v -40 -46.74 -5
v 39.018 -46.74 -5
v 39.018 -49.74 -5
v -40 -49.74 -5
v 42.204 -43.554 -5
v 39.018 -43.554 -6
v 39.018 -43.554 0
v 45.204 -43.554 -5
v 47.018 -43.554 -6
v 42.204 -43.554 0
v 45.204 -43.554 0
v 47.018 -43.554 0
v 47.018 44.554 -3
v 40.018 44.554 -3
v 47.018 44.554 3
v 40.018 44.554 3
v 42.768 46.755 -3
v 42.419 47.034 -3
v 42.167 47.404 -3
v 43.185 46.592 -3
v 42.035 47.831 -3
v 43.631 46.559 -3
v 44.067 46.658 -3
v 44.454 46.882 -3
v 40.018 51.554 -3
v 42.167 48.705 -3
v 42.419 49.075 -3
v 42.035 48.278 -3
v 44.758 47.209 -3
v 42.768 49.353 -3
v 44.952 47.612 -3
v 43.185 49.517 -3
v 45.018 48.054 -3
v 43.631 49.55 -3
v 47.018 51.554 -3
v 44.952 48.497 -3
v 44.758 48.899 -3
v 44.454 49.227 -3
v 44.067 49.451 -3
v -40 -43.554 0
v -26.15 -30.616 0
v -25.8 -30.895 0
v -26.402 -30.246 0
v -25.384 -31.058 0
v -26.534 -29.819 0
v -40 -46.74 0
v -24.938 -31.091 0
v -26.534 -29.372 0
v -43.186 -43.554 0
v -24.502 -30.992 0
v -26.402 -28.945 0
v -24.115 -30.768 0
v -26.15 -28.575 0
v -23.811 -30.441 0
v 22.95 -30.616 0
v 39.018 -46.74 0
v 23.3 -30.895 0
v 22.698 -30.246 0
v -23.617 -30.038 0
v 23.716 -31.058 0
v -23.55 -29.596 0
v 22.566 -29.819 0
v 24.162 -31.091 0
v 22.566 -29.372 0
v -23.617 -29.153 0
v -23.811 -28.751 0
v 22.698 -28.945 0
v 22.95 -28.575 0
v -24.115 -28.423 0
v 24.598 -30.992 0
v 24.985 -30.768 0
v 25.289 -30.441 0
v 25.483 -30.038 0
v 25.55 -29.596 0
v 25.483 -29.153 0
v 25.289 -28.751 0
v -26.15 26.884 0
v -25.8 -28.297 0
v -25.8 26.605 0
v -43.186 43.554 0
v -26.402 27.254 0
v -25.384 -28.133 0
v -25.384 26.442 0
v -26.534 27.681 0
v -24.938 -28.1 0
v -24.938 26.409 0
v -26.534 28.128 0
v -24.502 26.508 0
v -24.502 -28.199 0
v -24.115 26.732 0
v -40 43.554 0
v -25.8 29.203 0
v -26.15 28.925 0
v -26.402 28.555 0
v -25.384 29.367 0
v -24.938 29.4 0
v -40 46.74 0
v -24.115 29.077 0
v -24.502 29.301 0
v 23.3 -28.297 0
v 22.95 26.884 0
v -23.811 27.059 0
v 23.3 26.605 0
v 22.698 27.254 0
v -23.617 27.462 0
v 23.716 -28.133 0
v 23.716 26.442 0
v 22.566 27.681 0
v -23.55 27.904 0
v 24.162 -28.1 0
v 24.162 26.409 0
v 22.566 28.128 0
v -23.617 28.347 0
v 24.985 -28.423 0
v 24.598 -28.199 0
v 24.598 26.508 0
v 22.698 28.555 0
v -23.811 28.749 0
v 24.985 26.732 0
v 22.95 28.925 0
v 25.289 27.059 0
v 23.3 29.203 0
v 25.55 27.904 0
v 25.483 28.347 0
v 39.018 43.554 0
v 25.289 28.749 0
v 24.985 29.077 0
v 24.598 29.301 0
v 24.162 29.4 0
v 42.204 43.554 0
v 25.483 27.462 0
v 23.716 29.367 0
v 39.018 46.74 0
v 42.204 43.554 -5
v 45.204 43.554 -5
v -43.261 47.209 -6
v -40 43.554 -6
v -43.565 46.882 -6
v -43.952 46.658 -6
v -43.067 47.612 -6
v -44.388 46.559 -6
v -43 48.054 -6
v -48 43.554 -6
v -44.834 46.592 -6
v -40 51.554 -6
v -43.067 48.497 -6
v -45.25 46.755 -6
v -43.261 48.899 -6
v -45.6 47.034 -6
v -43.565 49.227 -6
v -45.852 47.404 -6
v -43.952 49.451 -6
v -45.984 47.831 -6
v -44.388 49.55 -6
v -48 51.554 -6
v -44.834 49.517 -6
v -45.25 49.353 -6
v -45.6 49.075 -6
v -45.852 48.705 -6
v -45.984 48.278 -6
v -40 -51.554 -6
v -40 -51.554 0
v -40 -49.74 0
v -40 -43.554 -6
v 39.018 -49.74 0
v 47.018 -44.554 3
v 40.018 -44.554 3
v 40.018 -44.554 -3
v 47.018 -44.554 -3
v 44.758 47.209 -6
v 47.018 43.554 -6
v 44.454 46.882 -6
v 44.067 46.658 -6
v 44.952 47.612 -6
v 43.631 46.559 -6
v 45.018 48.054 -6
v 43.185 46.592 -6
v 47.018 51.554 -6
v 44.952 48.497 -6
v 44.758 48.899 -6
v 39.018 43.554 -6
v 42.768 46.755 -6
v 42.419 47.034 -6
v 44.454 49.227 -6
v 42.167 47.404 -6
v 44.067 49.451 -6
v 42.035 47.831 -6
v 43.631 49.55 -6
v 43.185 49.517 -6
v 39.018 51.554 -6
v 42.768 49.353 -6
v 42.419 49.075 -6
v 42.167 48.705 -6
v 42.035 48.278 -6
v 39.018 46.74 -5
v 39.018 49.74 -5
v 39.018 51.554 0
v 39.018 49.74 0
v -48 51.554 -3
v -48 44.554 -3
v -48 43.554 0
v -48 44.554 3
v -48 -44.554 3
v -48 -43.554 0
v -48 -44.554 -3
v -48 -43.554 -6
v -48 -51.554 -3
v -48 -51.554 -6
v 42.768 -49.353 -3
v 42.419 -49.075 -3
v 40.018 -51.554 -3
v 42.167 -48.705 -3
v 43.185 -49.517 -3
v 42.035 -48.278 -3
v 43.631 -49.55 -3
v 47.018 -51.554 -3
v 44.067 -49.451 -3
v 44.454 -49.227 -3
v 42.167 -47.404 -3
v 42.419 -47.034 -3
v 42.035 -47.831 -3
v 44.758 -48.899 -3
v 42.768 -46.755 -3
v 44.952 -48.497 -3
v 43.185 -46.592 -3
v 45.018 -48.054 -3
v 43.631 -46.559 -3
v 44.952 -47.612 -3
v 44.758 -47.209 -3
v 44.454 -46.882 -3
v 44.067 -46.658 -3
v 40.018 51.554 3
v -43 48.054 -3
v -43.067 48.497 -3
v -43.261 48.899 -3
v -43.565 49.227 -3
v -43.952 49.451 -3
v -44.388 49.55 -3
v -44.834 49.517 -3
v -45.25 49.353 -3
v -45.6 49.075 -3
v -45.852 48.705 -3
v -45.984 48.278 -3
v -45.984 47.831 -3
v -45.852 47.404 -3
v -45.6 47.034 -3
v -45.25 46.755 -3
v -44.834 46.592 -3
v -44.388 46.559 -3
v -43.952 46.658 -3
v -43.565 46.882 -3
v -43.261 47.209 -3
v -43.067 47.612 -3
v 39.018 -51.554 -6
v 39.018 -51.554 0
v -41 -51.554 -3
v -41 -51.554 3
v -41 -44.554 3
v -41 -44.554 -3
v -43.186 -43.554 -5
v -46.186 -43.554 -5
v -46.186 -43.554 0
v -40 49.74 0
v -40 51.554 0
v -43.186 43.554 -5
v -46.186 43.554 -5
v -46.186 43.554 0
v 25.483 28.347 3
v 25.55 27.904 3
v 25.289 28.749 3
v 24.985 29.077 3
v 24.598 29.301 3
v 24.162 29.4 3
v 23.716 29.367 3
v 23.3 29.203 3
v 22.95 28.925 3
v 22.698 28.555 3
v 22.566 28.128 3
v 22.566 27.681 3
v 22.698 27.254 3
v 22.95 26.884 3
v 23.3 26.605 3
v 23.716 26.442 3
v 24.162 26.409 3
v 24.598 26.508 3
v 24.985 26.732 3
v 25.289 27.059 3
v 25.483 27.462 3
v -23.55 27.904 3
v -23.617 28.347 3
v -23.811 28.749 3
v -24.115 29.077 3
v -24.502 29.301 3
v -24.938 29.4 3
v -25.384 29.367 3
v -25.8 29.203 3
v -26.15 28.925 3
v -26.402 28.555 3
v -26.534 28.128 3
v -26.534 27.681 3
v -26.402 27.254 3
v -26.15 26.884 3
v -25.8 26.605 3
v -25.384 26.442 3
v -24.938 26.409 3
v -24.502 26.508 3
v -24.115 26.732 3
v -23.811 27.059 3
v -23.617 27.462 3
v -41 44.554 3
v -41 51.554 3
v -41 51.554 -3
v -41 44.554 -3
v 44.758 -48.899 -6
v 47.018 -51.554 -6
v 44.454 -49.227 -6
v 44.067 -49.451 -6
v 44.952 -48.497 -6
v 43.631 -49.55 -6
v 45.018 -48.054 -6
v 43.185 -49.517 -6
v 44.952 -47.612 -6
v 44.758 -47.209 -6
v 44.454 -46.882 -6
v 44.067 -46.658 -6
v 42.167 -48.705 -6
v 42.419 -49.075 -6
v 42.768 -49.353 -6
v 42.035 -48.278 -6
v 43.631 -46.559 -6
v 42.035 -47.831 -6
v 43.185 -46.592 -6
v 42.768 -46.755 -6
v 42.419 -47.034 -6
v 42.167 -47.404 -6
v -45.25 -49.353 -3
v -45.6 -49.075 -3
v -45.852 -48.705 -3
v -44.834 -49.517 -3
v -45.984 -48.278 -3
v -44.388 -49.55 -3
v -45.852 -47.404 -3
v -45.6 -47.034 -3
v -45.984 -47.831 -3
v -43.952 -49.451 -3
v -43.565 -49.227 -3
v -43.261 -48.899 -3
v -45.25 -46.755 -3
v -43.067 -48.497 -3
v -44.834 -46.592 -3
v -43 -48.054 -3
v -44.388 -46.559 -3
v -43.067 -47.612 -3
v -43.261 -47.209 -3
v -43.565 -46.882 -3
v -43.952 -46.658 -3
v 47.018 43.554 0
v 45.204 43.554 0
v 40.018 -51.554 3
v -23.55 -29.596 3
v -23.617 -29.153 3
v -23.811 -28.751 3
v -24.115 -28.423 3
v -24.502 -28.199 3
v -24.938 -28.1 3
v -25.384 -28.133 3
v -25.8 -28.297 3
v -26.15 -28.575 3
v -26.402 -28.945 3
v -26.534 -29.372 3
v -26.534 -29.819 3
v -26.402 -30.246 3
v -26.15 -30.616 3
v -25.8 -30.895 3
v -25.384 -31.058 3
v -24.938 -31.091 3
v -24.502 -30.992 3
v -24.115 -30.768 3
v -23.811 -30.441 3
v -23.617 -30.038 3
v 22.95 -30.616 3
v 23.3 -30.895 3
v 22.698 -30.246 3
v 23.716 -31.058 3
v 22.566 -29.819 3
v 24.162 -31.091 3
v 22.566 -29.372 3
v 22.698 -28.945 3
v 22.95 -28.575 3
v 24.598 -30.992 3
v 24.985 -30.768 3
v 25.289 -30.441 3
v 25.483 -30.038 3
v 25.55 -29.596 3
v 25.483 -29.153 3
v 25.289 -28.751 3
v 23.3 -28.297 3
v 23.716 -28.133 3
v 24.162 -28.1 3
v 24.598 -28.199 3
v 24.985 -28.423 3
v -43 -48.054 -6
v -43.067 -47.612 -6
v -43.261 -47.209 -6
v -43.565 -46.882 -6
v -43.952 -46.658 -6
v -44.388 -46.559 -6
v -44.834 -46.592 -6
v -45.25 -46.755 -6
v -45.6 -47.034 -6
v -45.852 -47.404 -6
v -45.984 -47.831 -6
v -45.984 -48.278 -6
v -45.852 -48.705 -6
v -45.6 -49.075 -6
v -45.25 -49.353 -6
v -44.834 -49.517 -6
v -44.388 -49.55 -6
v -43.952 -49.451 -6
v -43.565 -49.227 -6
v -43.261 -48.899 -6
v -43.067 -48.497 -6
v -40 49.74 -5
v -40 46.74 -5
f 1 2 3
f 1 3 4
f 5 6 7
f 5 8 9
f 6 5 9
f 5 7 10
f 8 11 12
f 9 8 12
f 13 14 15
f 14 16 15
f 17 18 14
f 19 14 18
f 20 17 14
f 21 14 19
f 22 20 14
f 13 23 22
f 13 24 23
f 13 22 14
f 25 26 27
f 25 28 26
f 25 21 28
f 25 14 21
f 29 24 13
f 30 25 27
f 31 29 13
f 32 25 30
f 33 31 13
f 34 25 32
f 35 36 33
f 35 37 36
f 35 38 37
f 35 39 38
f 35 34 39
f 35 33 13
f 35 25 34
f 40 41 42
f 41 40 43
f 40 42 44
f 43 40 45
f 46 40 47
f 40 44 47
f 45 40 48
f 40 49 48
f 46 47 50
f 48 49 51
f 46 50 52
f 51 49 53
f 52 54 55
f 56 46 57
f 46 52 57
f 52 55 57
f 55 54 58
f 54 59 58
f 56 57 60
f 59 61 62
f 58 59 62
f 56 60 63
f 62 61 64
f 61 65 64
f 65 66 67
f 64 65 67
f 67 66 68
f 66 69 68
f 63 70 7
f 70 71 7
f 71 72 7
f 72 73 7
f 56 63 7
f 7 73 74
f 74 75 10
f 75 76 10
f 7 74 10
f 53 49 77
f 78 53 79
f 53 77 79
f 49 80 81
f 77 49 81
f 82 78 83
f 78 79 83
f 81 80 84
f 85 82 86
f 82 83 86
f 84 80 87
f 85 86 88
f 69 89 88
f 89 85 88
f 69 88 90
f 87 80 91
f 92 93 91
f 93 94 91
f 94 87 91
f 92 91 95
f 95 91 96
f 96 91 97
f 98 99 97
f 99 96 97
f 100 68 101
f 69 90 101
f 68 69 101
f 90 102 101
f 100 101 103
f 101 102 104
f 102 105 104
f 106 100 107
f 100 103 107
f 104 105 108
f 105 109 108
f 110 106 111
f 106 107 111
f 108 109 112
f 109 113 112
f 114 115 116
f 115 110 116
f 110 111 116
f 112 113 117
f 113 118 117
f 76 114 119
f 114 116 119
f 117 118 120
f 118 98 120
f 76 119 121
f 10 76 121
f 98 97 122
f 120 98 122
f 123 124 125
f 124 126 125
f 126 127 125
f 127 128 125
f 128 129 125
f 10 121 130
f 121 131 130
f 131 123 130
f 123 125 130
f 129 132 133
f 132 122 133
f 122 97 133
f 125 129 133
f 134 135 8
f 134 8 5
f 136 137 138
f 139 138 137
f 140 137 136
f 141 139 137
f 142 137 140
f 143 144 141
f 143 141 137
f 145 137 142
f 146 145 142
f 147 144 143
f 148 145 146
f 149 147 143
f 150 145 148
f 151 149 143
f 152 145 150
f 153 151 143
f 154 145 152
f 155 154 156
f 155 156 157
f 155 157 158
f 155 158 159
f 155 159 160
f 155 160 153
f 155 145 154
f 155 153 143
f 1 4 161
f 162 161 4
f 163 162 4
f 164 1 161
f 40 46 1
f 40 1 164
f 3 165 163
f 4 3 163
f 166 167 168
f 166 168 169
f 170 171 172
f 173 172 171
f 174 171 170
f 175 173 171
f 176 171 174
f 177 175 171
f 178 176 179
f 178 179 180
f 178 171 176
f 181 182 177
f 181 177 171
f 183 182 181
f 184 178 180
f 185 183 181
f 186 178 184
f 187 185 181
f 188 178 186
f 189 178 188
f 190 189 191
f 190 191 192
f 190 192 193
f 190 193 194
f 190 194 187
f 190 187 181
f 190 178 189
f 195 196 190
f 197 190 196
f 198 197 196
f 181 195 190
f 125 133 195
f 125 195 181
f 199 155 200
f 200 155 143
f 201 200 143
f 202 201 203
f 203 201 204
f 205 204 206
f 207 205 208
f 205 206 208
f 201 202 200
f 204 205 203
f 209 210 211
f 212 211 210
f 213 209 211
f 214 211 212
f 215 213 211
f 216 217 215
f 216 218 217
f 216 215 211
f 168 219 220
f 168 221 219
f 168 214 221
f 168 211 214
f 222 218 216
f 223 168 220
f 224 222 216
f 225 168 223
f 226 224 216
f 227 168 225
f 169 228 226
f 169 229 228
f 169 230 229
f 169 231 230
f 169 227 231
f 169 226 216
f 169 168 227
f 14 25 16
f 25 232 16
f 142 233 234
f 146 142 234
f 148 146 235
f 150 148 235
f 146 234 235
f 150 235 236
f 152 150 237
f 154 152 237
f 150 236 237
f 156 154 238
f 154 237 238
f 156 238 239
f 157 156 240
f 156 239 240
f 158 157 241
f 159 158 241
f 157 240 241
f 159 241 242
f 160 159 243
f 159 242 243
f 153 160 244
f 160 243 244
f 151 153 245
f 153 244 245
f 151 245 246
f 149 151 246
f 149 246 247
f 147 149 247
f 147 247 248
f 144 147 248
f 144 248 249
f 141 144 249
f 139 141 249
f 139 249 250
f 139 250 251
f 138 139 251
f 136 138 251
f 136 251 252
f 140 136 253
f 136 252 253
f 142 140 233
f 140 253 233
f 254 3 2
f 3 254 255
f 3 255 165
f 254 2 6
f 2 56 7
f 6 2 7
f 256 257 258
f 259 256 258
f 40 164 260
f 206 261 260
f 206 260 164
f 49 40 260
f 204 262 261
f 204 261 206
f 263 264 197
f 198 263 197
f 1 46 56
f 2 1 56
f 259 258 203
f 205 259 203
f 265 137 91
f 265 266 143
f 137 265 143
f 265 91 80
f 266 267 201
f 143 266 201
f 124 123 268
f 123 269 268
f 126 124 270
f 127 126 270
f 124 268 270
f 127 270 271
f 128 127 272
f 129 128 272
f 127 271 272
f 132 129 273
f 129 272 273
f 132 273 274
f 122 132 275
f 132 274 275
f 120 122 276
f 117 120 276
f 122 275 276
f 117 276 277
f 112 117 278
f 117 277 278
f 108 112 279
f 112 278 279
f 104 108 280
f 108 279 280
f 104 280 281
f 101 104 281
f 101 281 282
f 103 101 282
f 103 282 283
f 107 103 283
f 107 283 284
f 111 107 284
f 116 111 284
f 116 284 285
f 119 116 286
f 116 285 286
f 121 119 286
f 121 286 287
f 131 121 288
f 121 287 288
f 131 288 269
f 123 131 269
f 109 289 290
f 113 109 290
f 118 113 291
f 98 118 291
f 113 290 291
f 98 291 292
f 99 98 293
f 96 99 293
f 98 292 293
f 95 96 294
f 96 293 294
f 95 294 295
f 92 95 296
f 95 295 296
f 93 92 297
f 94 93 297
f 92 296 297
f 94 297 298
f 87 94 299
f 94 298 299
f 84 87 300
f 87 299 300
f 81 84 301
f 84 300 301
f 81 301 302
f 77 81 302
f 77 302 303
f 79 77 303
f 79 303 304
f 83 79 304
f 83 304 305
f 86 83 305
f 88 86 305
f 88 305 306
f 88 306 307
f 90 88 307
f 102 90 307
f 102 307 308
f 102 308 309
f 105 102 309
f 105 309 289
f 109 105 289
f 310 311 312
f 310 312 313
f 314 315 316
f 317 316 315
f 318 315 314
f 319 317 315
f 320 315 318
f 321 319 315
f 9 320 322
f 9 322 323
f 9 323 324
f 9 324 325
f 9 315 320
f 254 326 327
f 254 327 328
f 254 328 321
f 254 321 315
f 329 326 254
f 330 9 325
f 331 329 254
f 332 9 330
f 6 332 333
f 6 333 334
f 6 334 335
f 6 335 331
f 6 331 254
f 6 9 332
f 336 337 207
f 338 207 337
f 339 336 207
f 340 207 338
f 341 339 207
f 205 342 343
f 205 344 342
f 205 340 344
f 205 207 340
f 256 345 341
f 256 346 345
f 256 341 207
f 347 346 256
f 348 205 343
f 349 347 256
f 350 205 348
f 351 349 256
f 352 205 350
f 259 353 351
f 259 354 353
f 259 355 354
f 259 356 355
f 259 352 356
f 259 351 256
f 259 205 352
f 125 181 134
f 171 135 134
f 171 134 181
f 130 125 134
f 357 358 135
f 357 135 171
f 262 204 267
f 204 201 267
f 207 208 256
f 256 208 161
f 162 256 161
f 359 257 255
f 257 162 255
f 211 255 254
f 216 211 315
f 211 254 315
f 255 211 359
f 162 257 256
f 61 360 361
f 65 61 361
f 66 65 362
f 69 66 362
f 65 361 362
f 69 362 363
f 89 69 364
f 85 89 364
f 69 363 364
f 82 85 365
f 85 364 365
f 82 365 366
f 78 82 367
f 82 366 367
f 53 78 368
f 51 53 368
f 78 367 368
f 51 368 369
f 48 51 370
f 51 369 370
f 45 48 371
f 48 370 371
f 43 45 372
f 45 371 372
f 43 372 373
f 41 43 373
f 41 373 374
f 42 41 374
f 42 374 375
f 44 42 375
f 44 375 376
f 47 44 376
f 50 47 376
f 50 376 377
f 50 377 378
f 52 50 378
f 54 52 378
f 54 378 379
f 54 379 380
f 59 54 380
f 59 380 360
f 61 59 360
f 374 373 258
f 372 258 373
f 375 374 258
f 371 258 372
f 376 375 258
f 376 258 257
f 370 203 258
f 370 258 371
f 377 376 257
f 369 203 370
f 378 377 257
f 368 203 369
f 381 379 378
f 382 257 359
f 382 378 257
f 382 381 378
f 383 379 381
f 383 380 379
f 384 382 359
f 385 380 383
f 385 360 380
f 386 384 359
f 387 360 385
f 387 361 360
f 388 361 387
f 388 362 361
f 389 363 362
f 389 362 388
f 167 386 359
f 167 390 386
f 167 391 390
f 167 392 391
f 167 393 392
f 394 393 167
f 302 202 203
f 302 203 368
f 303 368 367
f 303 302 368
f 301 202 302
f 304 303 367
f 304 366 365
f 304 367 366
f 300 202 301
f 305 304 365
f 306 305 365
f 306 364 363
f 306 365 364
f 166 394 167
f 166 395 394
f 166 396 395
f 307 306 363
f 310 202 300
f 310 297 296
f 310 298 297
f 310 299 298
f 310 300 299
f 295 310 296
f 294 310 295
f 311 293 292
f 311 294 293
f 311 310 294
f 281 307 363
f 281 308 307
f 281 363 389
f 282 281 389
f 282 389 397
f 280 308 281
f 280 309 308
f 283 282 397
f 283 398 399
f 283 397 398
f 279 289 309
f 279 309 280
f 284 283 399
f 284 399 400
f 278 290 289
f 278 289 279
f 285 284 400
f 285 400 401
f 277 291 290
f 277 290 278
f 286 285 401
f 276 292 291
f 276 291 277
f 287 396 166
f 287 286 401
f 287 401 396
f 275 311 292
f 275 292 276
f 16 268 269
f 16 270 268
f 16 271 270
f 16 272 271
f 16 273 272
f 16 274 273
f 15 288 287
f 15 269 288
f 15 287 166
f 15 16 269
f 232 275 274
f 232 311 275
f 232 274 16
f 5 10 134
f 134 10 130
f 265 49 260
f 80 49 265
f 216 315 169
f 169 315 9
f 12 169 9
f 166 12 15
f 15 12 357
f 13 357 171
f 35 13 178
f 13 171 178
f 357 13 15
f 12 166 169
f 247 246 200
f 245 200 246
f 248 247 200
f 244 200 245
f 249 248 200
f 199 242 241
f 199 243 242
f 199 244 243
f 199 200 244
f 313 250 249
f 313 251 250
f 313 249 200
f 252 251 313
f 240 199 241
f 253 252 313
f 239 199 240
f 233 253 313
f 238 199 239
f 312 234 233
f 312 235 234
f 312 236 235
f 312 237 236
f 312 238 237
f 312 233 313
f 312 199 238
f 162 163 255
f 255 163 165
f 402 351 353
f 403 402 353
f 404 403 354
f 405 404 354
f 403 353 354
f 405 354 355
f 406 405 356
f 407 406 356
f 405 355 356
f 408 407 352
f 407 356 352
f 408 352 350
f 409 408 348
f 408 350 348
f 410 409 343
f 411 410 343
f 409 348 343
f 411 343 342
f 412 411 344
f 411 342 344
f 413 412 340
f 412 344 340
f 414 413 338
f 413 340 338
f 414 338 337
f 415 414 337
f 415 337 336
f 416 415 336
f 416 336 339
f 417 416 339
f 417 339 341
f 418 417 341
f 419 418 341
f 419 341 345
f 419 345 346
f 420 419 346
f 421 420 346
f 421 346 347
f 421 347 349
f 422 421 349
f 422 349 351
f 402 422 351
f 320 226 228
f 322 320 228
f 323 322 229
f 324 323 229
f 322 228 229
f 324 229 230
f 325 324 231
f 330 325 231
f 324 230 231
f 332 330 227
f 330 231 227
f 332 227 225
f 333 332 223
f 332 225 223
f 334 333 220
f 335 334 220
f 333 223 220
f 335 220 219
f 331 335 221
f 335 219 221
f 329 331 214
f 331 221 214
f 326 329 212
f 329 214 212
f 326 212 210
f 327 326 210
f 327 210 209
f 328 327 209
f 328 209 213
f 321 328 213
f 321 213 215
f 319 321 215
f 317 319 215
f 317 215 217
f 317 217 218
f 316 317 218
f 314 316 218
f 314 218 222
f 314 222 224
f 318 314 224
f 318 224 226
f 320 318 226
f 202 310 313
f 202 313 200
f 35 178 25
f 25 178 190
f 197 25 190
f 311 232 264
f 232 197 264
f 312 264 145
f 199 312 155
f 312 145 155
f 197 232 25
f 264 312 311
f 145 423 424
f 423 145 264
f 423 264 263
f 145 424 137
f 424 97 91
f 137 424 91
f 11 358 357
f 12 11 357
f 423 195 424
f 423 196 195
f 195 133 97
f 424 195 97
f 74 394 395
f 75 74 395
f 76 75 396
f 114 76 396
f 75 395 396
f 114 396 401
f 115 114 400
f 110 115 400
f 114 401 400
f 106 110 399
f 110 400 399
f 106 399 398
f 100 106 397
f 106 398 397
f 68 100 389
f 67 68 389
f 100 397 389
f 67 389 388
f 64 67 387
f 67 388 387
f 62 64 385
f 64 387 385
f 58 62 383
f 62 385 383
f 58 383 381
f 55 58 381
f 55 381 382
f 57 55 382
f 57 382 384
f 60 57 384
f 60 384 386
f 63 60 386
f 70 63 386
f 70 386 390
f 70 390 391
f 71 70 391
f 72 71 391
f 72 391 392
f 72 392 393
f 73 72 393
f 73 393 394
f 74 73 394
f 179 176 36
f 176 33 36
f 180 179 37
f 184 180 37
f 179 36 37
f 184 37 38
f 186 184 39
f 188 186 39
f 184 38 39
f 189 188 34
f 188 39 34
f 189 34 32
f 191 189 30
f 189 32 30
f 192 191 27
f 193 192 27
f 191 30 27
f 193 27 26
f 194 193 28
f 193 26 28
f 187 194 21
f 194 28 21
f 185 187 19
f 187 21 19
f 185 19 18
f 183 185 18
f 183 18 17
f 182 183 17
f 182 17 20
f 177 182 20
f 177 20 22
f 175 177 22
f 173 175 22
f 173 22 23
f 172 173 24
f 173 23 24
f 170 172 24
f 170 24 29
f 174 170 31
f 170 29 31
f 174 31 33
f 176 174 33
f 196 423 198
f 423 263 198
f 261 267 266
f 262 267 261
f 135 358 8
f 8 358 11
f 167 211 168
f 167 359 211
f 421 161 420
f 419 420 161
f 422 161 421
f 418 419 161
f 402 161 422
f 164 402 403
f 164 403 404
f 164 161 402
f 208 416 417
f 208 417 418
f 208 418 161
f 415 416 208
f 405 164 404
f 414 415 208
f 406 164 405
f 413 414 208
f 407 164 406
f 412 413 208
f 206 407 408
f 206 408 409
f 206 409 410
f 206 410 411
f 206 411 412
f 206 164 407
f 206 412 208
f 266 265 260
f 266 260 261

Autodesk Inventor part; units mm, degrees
ref_plane "YZ Plane" through (0, 0, 0) normal (1, 0, 0) x (0, 1, 0)
ref_plane "XZ Plane" through (0, 0, 0) normal (0, 1, 0) x (-1, 0, 0)
ref_plane "XY Plane" through (0, 0, 0) normal (0, 0, 1) x (1, 0, 0)
sketch "Sketch1" plane through (0, 0, 0) normal (0, 0, 1) x (1, 0, 0)
  line L0 (47.0185, 51.5544) -> (-48.0003, 51.5544)
  line L1 (-48.0003, 51.5544) -> (-48.0003, -51.5544)
  line L2 (-48.0003, -51.5544) -> (47.0185, -51.5544)
  line L3 (47.0185, -51.5544) -> (47.0185, 51.5544)
  line L4 (41.2041, -35.74) -> (41.2041, 35.74) projected
  arc A0 (41.2041, 35.74) -> (31.2041, 45.74) centre (31.2041, 35.74) ccw projected
  line L5 (31.2041, 45.74) -> (-32.1859, 45.74) projected
  arc A1 (-32.1859, 45.74) -> (-42.1859, 35.74) centre (-32.1859, 35.74) ccw projected
  line L6 (-42.1859, 35.74) -> (-42.1859, -35.74) projected
  arc A2 (-42.1859, -35.74) -> (-32.1859, -45.74) centre (-32.1859, -35.74) ccw projected
  line L7 (-32.1859, -45.74) -> (31.2041, -45.74) projected
  arc A3 (31.2041, -45.74) -> (41.2041, -35.74) centre (31.2041, -35.74) ccw projected
  circle A4 centre (24.0591, 16.9245) radius 1.25 projected
  circle A5 centre (24.0591, -43.0755) radius 1.25 projected
  circle A6 centre (-25.0409, -43.0755) radius 1.25 projected
  circle A7 centre (-25.0409, 16.9245) radius 1.25 projected
  line L8 (25.5091, 38.0745) -> (-26.4909, 38.0745) projected
  arc A8 (-26.4909, 38.0745) -> (-28.4909, 36.0745) centre (-26.4909, 36.0745) ccw projected
  line L9 (-28.4909, 36.0745) -> (-28.4909, -44.9255) projected
  arc A9 (-28.4909, -44.9255) -> (-26.4909, -46.9255) centre (-26.4909, -44.9255) ccw projected
  line L10 (-26.4909, -46.9255) -> (25.5091, -46.9255) projected
  arc A10 (25.5091, -46.9255) -> (27.5091, -44.9255) centre (25.5091, -44.9255) ccw projected
  line L11 (27.5091, -44.9255) -> (27.5091, 36.0745) projected
  arc A11 (27.5091, 36.0745) -> (25.5091, 38.0745) centre (25.5091, 36.0745) ccw projected
  point P0 (0, 0)
  dimension "d2" = 5.8144
  dimension "d3" = 5.8144
  dimension "d4" = 5.8144
  dimension "d5" = 5.8144
extrude "Extrusion1" add sketch "Sketch1" along normal blind 3 contours L3 L2 L1 L0 | A3 L7 A10 L11 A11 L8 A8 L9 A9 A2 L6 A1 L5 A0 L4 | A10 L10 A9 L7 | L7 A9 L9 A8 L8 A11 L11 A10 | A4 | A5 | A6 | A7
sketch "Sketch3" plane through (0, 0, 0) normal (0, 0, -1) x (-1, 0, 0)
  line L0 (-41.2041, 35.74) -> (-41.2041, -35.74) projected
  arc A0 (-41.2041, -35.74) -> (-31.2041, -45.74) centre (-31.2041, -35.74) ccw projected
  line L1 (-31.2041, -45.74) -> (32.1859, -45.74) projected
  arc A1 (32.1859, -45.74) -> (42.1859, -35.74) centre (32.1859, -35.74) ccw projected
  line L2 (42.1859, -35.74) -> (42.1859, 35.74) projected
  arc A2 (42.1859, 35.74) -> (32.1859, 45.74) centre (32.1859, 35.74) ccw projected
  line L3 (32.1859, 45.74) -> (-31.2041, 45.74) projected
  arc A3 (-31.2041, 45.74) -> (-41.2041, 35.74) centre (-31.2041, 35.74) ccw projected
  line L4 (43.1859, 43.5544) -> (46.1859, 43.5544)
  line L5 (46.1859, 43.5544) -> (46.1859, -43.5544)
  line L6 (46.1859, -43.5544) -> (43.1859, -43.5544)
  line L7 (43.1859, -43.5544) -> (43.1859, 43.5544)
  line L8 (-42.2041, 43.5544) -> (-45.2041, 43.5544)
  line L9 (-45.2041, 43.5544) -> (-45.2041, -43.5544)
  line L10 (-45.2041, -43.5544) -> (-42.2041, -43.5544)
  line L11 (-42.2041, -43.5544) -> (-42.2041, 43.5544)
  line L12 (40.0003, 49.74) -> (-39.0185, 49.74)
  line L13 (-39.0185, 49.74) -> (-39.0185, 46.74)
  line L14 (-39.0185, 46.74) -> (40.0003, 46.74)
  line L15 (40.0003, 46.74) -> (40.0003, 49.74)
  line L16 (40.0003, -46.74) -> (-39.0185, -46.74)
  line L17 (-39.0185, -46.74) -> (-39.0185, -49.74)
  line L18 (-39.0185, -49.74) -> (40.0003, -49.74)
  line L19 (40.0003, -49.74) -> (40.0003, -46.74)
  line L20 (-47.0185, 51.5544) -> (48.0003, 51.5544) projected
  line L21 (48.0003, 51.5544) -> (48.0003, -51.5544) projected
  line L22 (48.0003, -51.5544) -> (-47.0185, -51.5544) projected
  line L23 (-47.0185, -51.5544) -> (-47.0185, 51.5544) projected
  point P0 (0, 0)
  dimension "d20" = 3
  dimension "d21" = 1
  dimension "d24" = 3
  dimension "d25" = 1
  dimension "d28" = 3
  dimension "d29" = 1
  dimension "d34" = 1
  dimension "d35" = 3
  dimension "d78" = 8
  dimension "d79" = 8
  dimension "d80" = 8
  dimension "d81" = 8
  dimension "d82" = 8
  dimension "d83" = 8
  dimension "d84" = 8
  dimension "d85" = 8
extrude "Extrusion2" add sketch "Sketch3" along normal blind 5 contours L4 L5 L6 L7 | L11 L10 L9 L8 | L15 L14 L13 L12 | L19 L18 L17 L16
sketch "Sketch6" plane through (0, 0, 0) normal (0, 0, -1) x (-1, 0, 0)
  line L0 (48.0003, 51.5544) -> (48.0003, -51.5544) projected
  line L1 (48.0003, 51.5544) -> (40.0003, 51.5544)
  line L2 (40.0003, 51.5544) -> (40.0003, 43.5544)
  line L3 (40.0003, 43.5544) -> (48.0003, 43.5544)
  line L4 (48.0003, 43.5544) -> (48.0003, 51.5544)
  line L5 (48.0003, -51.5544) -> (40.0003, -51.5544)
  line L6 (40.0003, -51.5544) -> (40.0003, -43.5544)
  line L7 (40.0003, -43.5544) -> (48.0003, -43.5544)
  line L8 (48.0003, -43.5544) -> (48.0003, -51.5544)
  line L9 (48.0003, -51.5544) -> (-47.0185, -51.5544) projected
  line L10 (-47.0185, -51.5544) -> (-39.0185, -51.5544)
  line L11 (-39.0185, -51.5544) -> (-39.0185, -43.5544)
  line L12 (-39.0185, -43.5544) -> (-47.0185, -43.5544)
  line L13 (-47.0185, -43.5544) -> (-47.0185, -51.5544)
  line L14 (-47.0185, 51.5544) -> (48.0003, 51.5544) projected
  line L15 (-47.0185, 51.5544) -> (-39.0185, 51.5544)
  line L16 (-39.0185, 51.5544) -> (-39.0185, 43.5544)
  line L17 (-39.0185, 43.5544) -> (-47.0185, 43.5544)
  line L18 (-47.0185, 43.5544) -> (-47.0185, 51.5544)
  point P0 (0, 0)
  dimension "d38" = 8
  dimension "d39" = 8
  dimension "d40" = 8
  dimension "d41" = 8
  dimension "d42" = 8
  dimension "d43" = 8
  dimension "d44" = 8
  dimension "d45" = 8
extrude "Extrusion3" add sketch "Sketch6" along normal blind 6
sketch "Sketch7" plane through (0, 0, 3) normal (0, 0, 1) x (1, 0, 0)
  line L0 (47.0185, -51.5544) -> (47.0185, 51.5544) projected
  line L1 (47.0185, 51.5544) -> (40.0185, 51.5544)
  line L2 (40.0185, 51.5544) -> (40.0185, 44.5544)
  line L3 (40.0185, 44.5544) -> (47.0185, 44.5544)
  line L4 (47.0185, 44.5544) -> (47.0185, 51.5544)
  line L5 (47.0185, -51.5544) -> (40.0185, -51.5544)
  line L6 (40.0185, -51.5544) -> (40.0185, -44.5544)
  line L7 (40.0185, -44.5544) -> (47.0185, -44.5544)
  line L8 (47.0185, -44.5544) -> (47.0185, -51.5544)
  line L9 (-48.0003, 51.5544) -> (-48.0003, -51.5544) projected
  line L10 (-48.0003, -51.5544) -> (-41.0003, -51.5544)
  line L11 (-41.0003, -51.5544) -> (-41.0003, -44.5544)
  line L12 (-41.0003, -44.5544) -> (-48.0003, -44.5544)
  line L13 (-48.0003, -44.5544) -> (-48.0003, -51.5544)
  line L14 (-48.0003, 51.5544) -> (-41.0003, 51.5544)
  line L15 (-41.0003, 51.5544) -> (-41.0003, 44.5544)
  line L16 (-41.0003, 44.5544) -> (-48.0003, 44.5544)
  line L17 (-48.0003, 44.5544) -> (-48.0003, 51.5544)
  point P0 (0, 0)
  dimension "d48" = 7
  dimension "d49" = 7
  dimension "d50" = 7
  dimension "d51" = 7
  dimension "d52" = 7
  dimension "d53" = 7
  dimension "d54" = 7
  dimension "d55" = 7
extrude "Extrusion4" cut sketch "Sketch7" against normal blind 6
sketch "Sketch8" plane through (0, 0, -3) normal (0, 0, 1) x (1, 0, 0)
  circle A0 centre (43.5185, 48.0544) radius 1.5
  circle A1 centre (43.5185, -48.0544) radius 1.5
  circle A2 centre (-44.5003, -48.0544) radius 1.5
  circle A3 centre (-44.5003, 48.0544) radius 1.5
  line L0 (47.0185, 51.5544) -> (47.0185, 44.5544) projected
  line L1 (40.0185, 51.5544) -> (47.0185, 51.5544) projected
  line L2 (47.0185, -44.5544) -> (47.0185, -51.5544) projected
  line L3 (47.0185, -51.5544) -> (40.0185, -51.5544) projected
  line L4 (-48.0003, -51.5544) -> (-48.0003, -44.5544) projected
  line L5 (-41.0003, -51.5544) -> (-48.0003, -51.5544) projected
  line L6 (-48.0003, 44.5544) -> (-48.0003, 51.5544) projected
  line L7 (-48.0003, 51.5544) -> (-41.0003, 51.5544) projected
  point P0 (0, 0)
  dimension "d58" = 3
  dimension "d59" = 3
  dimension "d60" = 3
  dimension "d61" = 3
  dimension "d62" = 3.5
  dimension "d63" = 3.5
  dimension "d64" = 3.5
  dimension "d65" = 3.5
  dimension "d66" = 3.5
  dimension "d67" = 3.5
  dimension "d68" = 3.5
  dimension "d69" = 3.5
extrude "Extrusion5" cut sketch "Sketch8" against normal up to next
sketch "Sketch9" plane through (0, 0, 3) normal (0, 0, 1) x (1, 0, 0)
  circle A0 centre (24.0497, -29.5956) radius 1.25 projected
  circle A1 centre (-25.0503, -29.5956) radius 1.25 projected
  line L0 (25.4997, 51.5544) -> (-26.5003, 51.5544) projected
  arc A2 (-26.5003, 51.5544) -> (-28.5003, 49.5544) centre (-26.5003, 49.5544) ccw projected
  line L1 (-28.5003, 49.5544) -> (-28.5003, -31.4456) projected
  arc A3 (-28.5003, -31.4456) -> (-26.5003, -33.4456) centre (-26.5003, -31.4456) ccw projected
  line L2 (-26.5003, -33.4456) -> (25.4997, -33.4456) projected
  arc A4 (25.4997, -33.4456) -> (27.4997, -31.4456) centre (25.4997, -31.4456) ccw projected
  line L3 (27.4997, -31.4456) -> (27.4997, 49.5544) projected
  arc A5 (27.4997, 49.5544) -> (25.4997, 51.5544) centre (25.4997, 49.5544) ccw projected
  circle A6 centre (24.0497, -29.5956) radius 1.5
  circle A7 centre (-25.0503, -29.5956) radius 1.5
  circle A8 centre (24.0497, 27.9044) radius 1.25 projected
  circle A9 centre (24.0497, -29.5956) radius 1.25 projected
  circle A10 centre (-25.0503, -29.5956) radius 1.25 projected
  circle A11 centre (-25.0503, 27.9044) radius 1.25 projected
  line L4 (25.4997, 51.5544) -> (-26.5003, 51.5544) projected
  arc A12 (-26.5003, 51.5544) -> (-28.5003, 49.5544) centre (-26.5003, 49.5544) ccw projected
  line L5 (-28.5003, 49.5544) -> (-28.5003, -31.4456) projected
  arc A13 (-28.5003, -31.4456) -> (-26.5003, -33.4456) centre (-26.5003, -31.4456) ccw projected
  line L6 (-26.5003, -33.4456) -> (25.4997, -33.4456) projected
  arc A14 (25.4997, -33.4456) -> (27.4997, -31.4456) centre (25.4997, -31.4456) ccw projected
  line L7 (27.4997, -31.4456) -> (27.4997, 49.5544) projected
  arc A15 (27.4997, 49.5544) -> (25.4997, 51.5544) centre (25.4997, 49.5544) ccw projected
  circle A16 centre (24.0497, 27.9044) radius 1.5
  circle A17 centre (-25.0503, 27.9044) radius 1.5
  point P0 (0, 0)
  dimension "d73" = 3
  dimension "d74" = 3
  dimension "d86" = 3
  dimension "d87" = 3
extrude "Extrusion6" cut sketch "Sketch9" against normal up to next contours A0 | A1 | A6 | A7 | A8 | A11 | A16 | A17
equation "\"d3\" = d2"
equation "\"d4\" = d2"
equation "\"d5\" = d2"
equation "\"d39\" = d38"
equation "\"d40\" = d38"
equation "\"d41\" = d38"
equation "\"d42\" = d38"
equation "\"d43\" = d38"
equation "\"d44\" = d38"
equation "\"d45\" = d38"
equation "\"d49\" = d48"
equation "\"d50\" = d48"
equation "\"d51\" = d48"
equation "\"d52\" = d48"
equation "\"d53\" = d48"
equation "\"d54\" = d48"
equation "\"d55\" = d48"
equation "\"d62\" = 0.5 * d48"
equation "\"d63\" = d62"
equation "\"d64\" = d62"
equation "\"d65\" = d62"
equation "\"d66\" = d62"
equation "\"d67\" = d62"
equation "\"d68\" = d62"
equation "\"d69\" = d62"
equation "\"d74\" = d73"
equation "\"d86\" = d73"
equation "\"d87\" = d73"
properties part number "akksi-raspi"
